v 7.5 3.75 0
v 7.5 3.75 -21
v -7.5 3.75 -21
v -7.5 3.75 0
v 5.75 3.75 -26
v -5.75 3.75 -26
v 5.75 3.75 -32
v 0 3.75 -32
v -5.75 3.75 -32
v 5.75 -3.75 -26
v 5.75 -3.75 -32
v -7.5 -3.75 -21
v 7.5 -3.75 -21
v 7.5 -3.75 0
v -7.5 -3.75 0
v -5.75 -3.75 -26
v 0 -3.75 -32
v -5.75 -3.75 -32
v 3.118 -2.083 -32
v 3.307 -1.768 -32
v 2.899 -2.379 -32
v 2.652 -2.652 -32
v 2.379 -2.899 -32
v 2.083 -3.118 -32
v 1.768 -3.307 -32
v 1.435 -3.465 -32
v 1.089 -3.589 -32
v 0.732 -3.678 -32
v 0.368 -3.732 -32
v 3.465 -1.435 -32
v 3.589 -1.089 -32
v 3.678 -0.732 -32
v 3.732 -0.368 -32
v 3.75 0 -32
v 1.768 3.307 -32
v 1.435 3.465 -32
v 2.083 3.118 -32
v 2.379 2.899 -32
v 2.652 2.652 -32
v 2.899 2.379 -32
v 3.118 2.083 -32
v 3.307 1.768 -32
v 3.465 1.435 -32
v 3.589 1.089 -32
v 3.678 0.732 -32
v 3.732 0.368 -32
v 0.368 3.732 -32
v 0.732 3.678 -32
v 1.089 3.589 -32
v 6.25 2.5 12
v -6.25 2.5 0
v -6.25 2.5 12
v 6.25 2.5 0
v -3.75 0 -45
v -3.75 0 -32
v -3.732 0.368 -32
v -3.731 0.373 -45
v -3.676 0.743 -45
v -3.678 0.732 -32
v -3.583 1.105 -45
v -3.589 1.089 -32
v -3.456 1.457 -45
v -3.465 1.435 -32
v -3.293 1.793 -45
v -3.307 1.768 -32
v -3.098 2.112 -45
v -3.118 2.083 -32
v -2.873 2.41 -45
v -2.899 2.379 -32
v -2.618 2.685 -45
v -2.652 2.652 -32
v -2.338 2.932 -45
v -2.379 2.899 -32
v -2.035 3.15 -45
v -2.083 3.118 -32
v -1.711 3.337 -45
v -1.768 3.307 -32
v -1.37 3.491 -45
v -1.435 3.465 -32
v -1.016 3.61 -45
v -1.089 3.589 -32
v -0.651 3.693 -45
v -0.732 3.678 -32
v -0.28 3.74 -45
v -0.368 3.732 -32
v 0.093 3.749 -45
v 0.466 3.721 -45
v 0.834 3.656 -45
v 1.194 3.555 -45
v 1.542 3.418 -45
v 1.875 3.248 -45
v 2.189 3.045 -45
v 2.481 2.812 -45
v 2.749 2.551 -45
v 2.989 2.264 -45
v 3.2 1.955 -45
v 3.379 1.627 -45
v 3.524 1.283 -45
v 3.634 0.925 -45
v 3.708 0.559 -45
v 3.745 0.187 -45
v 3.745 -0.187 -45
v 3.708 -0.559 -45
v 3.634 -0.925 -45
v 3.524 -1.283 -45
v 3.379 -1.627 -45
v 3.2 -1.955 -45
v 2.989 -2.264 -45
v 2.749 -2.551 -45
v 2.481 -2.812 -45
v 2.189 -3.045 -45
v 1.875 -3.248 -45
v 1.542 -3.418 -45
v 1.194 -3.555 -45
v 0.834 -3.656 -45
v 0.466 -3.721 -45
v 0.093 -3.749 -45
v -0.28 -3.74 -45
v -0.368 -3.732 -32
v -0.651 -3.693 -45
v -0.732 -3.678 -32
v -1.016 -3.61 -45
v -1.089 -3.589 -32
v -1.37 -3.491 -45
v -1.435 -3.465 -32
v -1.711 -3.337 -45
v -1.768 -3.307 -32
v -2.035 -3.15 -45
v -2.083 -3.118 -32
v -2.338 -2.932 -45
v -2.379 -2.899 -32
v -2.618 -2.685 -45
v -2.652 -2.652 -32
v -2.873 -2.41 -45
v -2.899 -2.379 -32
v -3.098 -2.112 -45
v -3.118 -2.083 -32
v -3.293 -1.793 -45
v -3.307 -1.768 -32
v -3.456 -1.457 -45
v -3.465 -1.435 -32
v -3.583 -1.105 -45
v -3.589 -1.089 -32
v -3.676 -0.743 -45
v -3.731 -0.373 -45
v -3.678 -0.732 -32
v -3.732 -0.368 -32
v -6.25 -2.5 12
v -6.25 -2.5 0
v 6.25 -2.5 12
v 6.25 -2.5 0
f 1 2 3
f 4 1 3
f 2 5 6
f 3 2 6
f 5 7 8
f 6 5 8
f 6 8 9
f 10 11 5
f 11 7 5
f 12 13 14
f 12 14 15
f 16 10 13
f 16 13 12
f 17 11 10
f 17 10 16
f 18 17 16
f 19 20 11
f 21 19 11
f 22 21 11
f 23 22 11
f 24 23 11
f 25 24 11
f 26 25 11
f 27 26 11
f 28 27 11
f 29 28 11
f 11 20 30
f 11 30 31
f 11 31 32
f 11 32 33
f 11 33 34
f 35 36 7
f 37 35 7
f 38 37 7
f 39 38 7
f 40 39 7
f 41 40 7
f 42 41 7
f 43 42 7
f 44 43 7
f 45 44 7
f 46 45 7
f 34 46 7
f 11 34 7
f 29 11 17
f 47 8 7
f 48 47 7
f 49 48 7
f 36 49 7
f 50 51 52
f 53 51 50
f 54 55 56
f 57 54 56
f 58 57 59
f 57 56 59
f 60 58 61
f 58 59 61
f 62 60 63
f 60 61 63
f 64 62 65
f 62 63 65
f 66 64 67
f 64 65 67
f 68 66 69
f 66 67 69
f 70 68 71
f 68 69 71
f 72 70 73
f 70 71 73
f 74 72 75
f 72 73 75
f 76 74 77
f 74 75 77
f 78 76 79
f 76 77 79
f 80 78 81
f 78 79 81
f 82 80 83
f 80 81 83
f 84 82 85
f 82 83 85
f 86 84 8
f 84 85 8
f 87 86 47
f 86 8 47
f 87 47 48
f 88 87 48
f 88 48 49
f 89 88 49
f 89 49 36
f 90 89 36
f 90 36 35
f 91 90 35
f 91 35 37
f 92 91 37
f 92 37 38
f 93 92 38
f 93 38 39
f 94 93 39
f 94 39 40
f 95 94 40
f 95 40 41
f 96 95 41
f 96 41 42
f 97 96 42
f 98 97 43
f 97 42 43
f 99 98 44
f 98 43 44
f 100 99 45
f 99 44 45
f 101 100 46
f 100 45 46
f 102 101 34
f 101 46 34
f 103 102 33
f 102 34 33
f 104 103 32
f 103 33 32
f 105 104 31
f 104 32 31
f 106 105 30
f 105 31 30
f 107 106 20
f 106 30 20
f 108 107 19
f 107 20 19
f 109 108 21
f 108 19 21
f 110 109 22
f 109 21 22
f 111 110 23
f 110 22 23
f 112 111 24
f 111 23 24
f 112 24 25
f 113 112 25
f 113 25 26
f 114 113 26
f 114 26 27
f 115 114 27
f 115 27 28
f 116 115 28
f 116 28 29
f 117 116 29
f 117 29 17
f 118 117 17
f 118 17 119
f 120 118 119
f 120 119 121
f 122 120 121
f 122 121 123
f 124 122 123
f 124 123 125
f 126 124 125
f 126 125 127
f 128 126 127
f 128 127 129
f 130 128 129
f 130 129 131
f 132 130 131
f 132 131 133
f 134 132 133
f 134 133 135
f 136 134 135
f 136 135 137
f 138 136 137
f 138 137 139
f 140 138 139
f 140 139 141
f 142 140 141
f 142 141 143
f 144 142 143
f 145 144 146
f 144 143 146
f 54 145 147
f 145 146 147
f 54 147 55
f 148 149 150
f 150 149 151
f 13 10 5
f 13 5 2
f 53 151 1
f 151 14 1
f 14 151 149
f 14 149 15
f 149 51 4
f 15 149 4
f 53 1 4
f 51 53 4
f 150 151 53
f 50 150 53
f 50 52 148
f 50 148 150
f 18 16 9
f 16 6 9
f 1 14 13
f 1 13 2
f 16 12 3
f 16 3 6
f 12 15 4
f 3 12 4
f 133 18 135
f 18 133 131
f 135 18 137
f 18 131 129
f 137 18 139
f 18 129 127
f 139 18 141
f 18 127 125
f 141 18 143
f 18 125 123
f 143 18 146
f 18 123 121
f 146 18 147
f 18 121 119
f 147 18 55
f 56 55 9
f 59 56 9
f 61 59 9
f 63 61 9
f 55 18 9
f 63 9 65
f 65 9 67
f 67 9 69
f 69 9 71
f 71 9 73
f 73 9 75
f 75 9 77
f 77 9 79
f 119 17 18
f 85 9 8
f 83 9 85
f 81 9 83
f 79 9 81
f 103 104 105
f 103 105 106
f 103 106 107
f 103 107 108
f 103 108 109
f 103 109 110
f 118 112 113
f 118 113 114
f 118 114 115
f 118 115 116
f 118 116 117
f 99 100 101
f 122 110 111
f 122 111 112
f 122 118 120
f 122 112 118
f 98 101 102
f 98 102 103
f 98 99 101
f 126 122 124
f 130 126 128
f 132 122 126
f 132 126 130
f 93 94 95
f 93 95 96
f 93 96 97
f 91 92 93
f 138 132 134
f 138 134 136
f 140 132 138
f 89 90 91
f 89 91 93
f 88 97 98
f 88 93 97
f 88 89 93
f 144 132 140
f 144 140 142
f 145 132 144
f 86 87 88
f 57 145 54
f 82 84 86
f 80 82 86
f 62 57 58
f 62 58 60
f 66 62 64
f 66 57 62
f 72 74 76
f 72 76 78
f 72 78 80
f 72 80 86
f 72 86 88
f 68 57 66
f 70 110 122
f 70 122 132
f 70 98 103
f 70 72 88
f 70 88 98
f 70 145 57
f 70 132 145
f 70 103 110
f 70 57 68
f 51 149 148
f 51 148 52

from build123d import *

# Parameters (mm, degrees)
SKIZZE1_W                            = 12.5
SKIZZE1_H                            = 5
AUFSATZ_LINEAR_AUSTRAGEN1_DEPTH      = 12
SKIZZE2_W                            = 15
SKIZZE2_H                            = 7.5
AUFSATZ_LINEAR_AUSTRAGEN2_DEPTH      = 21
AUFSATZ_LINEAR_AUSTRAGEN3_DEPTH      = 3.75
AUFSATZ_LINEAR_AUSTRAGEN3_DEPTH_BACK = 3.75
SKIZZE4_R                            = 3.75
AUFSATZ_LINEAR_AUSTRAGEN4_DEPTH      = 13


with BuildPart() as part:
    # Skizze1 → Aufsatz-Linear austragen1 (new body)
    with BuildSketch(Plane.XY):
        Rectangle(SKIZZE1_W, SKIZZE1_H)
    extrude(amount=AUFSATZ_LINEAR_AUSTRAGEN1_DEPTH)

    # Skizze2 → Aufsatz-Linear austragen2 (add)
    with BuildSketch(Plane(origin=(0, 0, 0), x_dir=(-1, 0, 0), z_dir=(0, 0, -1))):
        Rectangle(SKIZZE2_W, SKIZZE2_H)
    extrude(amount=AUFSATZ_LINEAR_AUSTRAGEN2_DEPTH)

    # Skizze3 → Aufsatz-Linear austragen3 (add, two sides)
    with BuildSketch(Plane(origin=(0, 0, 0), x_dir=(1, 0, 0), z_dir=(0, 1, 0))) as aufsatz_linear_austragen3_sk:
        Polygon((-7.5, 21), (-5.75, 26), (-5.75, 32), (5.75, 32), (5.75, 26), (7.5, 21), align=None)
    extrude(amount=AUFSATZ_LINEAR_AUSTRAGEN3_DEPTH)
    extrude(aufsatz_linear_austragen3_sk.sketch, amount=-AUFSATZ_LINEAR_AUSTRAGEN3_DEPTH_BACK)

    # Skizze4 → Aufsatz-Linear austragen4 (add)
    with BuildSketch(Plane(origin=(0, 0, -32), x_dir=(-1, 0, 0), z_dir=(0, 0, -1))):
        Circle(SKIZZE4_R)
    extrude(amount=AUFSATZ_LINEAR_AUSTRAGEN4_DEPTH)


solid = part.part
